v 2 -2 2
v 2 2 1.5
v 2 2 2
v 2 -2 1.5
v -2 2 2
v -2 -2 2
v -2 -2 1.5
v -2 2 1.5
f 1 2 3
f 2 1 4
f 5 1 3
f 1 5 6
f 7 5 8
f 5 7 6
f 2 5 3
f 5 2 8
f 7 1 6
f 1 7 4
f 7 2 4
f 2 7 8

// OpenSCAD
difference(){cube([4,4,4],center=true);
translate([0,0,-1])cube([5,5,5],center=true);
}
